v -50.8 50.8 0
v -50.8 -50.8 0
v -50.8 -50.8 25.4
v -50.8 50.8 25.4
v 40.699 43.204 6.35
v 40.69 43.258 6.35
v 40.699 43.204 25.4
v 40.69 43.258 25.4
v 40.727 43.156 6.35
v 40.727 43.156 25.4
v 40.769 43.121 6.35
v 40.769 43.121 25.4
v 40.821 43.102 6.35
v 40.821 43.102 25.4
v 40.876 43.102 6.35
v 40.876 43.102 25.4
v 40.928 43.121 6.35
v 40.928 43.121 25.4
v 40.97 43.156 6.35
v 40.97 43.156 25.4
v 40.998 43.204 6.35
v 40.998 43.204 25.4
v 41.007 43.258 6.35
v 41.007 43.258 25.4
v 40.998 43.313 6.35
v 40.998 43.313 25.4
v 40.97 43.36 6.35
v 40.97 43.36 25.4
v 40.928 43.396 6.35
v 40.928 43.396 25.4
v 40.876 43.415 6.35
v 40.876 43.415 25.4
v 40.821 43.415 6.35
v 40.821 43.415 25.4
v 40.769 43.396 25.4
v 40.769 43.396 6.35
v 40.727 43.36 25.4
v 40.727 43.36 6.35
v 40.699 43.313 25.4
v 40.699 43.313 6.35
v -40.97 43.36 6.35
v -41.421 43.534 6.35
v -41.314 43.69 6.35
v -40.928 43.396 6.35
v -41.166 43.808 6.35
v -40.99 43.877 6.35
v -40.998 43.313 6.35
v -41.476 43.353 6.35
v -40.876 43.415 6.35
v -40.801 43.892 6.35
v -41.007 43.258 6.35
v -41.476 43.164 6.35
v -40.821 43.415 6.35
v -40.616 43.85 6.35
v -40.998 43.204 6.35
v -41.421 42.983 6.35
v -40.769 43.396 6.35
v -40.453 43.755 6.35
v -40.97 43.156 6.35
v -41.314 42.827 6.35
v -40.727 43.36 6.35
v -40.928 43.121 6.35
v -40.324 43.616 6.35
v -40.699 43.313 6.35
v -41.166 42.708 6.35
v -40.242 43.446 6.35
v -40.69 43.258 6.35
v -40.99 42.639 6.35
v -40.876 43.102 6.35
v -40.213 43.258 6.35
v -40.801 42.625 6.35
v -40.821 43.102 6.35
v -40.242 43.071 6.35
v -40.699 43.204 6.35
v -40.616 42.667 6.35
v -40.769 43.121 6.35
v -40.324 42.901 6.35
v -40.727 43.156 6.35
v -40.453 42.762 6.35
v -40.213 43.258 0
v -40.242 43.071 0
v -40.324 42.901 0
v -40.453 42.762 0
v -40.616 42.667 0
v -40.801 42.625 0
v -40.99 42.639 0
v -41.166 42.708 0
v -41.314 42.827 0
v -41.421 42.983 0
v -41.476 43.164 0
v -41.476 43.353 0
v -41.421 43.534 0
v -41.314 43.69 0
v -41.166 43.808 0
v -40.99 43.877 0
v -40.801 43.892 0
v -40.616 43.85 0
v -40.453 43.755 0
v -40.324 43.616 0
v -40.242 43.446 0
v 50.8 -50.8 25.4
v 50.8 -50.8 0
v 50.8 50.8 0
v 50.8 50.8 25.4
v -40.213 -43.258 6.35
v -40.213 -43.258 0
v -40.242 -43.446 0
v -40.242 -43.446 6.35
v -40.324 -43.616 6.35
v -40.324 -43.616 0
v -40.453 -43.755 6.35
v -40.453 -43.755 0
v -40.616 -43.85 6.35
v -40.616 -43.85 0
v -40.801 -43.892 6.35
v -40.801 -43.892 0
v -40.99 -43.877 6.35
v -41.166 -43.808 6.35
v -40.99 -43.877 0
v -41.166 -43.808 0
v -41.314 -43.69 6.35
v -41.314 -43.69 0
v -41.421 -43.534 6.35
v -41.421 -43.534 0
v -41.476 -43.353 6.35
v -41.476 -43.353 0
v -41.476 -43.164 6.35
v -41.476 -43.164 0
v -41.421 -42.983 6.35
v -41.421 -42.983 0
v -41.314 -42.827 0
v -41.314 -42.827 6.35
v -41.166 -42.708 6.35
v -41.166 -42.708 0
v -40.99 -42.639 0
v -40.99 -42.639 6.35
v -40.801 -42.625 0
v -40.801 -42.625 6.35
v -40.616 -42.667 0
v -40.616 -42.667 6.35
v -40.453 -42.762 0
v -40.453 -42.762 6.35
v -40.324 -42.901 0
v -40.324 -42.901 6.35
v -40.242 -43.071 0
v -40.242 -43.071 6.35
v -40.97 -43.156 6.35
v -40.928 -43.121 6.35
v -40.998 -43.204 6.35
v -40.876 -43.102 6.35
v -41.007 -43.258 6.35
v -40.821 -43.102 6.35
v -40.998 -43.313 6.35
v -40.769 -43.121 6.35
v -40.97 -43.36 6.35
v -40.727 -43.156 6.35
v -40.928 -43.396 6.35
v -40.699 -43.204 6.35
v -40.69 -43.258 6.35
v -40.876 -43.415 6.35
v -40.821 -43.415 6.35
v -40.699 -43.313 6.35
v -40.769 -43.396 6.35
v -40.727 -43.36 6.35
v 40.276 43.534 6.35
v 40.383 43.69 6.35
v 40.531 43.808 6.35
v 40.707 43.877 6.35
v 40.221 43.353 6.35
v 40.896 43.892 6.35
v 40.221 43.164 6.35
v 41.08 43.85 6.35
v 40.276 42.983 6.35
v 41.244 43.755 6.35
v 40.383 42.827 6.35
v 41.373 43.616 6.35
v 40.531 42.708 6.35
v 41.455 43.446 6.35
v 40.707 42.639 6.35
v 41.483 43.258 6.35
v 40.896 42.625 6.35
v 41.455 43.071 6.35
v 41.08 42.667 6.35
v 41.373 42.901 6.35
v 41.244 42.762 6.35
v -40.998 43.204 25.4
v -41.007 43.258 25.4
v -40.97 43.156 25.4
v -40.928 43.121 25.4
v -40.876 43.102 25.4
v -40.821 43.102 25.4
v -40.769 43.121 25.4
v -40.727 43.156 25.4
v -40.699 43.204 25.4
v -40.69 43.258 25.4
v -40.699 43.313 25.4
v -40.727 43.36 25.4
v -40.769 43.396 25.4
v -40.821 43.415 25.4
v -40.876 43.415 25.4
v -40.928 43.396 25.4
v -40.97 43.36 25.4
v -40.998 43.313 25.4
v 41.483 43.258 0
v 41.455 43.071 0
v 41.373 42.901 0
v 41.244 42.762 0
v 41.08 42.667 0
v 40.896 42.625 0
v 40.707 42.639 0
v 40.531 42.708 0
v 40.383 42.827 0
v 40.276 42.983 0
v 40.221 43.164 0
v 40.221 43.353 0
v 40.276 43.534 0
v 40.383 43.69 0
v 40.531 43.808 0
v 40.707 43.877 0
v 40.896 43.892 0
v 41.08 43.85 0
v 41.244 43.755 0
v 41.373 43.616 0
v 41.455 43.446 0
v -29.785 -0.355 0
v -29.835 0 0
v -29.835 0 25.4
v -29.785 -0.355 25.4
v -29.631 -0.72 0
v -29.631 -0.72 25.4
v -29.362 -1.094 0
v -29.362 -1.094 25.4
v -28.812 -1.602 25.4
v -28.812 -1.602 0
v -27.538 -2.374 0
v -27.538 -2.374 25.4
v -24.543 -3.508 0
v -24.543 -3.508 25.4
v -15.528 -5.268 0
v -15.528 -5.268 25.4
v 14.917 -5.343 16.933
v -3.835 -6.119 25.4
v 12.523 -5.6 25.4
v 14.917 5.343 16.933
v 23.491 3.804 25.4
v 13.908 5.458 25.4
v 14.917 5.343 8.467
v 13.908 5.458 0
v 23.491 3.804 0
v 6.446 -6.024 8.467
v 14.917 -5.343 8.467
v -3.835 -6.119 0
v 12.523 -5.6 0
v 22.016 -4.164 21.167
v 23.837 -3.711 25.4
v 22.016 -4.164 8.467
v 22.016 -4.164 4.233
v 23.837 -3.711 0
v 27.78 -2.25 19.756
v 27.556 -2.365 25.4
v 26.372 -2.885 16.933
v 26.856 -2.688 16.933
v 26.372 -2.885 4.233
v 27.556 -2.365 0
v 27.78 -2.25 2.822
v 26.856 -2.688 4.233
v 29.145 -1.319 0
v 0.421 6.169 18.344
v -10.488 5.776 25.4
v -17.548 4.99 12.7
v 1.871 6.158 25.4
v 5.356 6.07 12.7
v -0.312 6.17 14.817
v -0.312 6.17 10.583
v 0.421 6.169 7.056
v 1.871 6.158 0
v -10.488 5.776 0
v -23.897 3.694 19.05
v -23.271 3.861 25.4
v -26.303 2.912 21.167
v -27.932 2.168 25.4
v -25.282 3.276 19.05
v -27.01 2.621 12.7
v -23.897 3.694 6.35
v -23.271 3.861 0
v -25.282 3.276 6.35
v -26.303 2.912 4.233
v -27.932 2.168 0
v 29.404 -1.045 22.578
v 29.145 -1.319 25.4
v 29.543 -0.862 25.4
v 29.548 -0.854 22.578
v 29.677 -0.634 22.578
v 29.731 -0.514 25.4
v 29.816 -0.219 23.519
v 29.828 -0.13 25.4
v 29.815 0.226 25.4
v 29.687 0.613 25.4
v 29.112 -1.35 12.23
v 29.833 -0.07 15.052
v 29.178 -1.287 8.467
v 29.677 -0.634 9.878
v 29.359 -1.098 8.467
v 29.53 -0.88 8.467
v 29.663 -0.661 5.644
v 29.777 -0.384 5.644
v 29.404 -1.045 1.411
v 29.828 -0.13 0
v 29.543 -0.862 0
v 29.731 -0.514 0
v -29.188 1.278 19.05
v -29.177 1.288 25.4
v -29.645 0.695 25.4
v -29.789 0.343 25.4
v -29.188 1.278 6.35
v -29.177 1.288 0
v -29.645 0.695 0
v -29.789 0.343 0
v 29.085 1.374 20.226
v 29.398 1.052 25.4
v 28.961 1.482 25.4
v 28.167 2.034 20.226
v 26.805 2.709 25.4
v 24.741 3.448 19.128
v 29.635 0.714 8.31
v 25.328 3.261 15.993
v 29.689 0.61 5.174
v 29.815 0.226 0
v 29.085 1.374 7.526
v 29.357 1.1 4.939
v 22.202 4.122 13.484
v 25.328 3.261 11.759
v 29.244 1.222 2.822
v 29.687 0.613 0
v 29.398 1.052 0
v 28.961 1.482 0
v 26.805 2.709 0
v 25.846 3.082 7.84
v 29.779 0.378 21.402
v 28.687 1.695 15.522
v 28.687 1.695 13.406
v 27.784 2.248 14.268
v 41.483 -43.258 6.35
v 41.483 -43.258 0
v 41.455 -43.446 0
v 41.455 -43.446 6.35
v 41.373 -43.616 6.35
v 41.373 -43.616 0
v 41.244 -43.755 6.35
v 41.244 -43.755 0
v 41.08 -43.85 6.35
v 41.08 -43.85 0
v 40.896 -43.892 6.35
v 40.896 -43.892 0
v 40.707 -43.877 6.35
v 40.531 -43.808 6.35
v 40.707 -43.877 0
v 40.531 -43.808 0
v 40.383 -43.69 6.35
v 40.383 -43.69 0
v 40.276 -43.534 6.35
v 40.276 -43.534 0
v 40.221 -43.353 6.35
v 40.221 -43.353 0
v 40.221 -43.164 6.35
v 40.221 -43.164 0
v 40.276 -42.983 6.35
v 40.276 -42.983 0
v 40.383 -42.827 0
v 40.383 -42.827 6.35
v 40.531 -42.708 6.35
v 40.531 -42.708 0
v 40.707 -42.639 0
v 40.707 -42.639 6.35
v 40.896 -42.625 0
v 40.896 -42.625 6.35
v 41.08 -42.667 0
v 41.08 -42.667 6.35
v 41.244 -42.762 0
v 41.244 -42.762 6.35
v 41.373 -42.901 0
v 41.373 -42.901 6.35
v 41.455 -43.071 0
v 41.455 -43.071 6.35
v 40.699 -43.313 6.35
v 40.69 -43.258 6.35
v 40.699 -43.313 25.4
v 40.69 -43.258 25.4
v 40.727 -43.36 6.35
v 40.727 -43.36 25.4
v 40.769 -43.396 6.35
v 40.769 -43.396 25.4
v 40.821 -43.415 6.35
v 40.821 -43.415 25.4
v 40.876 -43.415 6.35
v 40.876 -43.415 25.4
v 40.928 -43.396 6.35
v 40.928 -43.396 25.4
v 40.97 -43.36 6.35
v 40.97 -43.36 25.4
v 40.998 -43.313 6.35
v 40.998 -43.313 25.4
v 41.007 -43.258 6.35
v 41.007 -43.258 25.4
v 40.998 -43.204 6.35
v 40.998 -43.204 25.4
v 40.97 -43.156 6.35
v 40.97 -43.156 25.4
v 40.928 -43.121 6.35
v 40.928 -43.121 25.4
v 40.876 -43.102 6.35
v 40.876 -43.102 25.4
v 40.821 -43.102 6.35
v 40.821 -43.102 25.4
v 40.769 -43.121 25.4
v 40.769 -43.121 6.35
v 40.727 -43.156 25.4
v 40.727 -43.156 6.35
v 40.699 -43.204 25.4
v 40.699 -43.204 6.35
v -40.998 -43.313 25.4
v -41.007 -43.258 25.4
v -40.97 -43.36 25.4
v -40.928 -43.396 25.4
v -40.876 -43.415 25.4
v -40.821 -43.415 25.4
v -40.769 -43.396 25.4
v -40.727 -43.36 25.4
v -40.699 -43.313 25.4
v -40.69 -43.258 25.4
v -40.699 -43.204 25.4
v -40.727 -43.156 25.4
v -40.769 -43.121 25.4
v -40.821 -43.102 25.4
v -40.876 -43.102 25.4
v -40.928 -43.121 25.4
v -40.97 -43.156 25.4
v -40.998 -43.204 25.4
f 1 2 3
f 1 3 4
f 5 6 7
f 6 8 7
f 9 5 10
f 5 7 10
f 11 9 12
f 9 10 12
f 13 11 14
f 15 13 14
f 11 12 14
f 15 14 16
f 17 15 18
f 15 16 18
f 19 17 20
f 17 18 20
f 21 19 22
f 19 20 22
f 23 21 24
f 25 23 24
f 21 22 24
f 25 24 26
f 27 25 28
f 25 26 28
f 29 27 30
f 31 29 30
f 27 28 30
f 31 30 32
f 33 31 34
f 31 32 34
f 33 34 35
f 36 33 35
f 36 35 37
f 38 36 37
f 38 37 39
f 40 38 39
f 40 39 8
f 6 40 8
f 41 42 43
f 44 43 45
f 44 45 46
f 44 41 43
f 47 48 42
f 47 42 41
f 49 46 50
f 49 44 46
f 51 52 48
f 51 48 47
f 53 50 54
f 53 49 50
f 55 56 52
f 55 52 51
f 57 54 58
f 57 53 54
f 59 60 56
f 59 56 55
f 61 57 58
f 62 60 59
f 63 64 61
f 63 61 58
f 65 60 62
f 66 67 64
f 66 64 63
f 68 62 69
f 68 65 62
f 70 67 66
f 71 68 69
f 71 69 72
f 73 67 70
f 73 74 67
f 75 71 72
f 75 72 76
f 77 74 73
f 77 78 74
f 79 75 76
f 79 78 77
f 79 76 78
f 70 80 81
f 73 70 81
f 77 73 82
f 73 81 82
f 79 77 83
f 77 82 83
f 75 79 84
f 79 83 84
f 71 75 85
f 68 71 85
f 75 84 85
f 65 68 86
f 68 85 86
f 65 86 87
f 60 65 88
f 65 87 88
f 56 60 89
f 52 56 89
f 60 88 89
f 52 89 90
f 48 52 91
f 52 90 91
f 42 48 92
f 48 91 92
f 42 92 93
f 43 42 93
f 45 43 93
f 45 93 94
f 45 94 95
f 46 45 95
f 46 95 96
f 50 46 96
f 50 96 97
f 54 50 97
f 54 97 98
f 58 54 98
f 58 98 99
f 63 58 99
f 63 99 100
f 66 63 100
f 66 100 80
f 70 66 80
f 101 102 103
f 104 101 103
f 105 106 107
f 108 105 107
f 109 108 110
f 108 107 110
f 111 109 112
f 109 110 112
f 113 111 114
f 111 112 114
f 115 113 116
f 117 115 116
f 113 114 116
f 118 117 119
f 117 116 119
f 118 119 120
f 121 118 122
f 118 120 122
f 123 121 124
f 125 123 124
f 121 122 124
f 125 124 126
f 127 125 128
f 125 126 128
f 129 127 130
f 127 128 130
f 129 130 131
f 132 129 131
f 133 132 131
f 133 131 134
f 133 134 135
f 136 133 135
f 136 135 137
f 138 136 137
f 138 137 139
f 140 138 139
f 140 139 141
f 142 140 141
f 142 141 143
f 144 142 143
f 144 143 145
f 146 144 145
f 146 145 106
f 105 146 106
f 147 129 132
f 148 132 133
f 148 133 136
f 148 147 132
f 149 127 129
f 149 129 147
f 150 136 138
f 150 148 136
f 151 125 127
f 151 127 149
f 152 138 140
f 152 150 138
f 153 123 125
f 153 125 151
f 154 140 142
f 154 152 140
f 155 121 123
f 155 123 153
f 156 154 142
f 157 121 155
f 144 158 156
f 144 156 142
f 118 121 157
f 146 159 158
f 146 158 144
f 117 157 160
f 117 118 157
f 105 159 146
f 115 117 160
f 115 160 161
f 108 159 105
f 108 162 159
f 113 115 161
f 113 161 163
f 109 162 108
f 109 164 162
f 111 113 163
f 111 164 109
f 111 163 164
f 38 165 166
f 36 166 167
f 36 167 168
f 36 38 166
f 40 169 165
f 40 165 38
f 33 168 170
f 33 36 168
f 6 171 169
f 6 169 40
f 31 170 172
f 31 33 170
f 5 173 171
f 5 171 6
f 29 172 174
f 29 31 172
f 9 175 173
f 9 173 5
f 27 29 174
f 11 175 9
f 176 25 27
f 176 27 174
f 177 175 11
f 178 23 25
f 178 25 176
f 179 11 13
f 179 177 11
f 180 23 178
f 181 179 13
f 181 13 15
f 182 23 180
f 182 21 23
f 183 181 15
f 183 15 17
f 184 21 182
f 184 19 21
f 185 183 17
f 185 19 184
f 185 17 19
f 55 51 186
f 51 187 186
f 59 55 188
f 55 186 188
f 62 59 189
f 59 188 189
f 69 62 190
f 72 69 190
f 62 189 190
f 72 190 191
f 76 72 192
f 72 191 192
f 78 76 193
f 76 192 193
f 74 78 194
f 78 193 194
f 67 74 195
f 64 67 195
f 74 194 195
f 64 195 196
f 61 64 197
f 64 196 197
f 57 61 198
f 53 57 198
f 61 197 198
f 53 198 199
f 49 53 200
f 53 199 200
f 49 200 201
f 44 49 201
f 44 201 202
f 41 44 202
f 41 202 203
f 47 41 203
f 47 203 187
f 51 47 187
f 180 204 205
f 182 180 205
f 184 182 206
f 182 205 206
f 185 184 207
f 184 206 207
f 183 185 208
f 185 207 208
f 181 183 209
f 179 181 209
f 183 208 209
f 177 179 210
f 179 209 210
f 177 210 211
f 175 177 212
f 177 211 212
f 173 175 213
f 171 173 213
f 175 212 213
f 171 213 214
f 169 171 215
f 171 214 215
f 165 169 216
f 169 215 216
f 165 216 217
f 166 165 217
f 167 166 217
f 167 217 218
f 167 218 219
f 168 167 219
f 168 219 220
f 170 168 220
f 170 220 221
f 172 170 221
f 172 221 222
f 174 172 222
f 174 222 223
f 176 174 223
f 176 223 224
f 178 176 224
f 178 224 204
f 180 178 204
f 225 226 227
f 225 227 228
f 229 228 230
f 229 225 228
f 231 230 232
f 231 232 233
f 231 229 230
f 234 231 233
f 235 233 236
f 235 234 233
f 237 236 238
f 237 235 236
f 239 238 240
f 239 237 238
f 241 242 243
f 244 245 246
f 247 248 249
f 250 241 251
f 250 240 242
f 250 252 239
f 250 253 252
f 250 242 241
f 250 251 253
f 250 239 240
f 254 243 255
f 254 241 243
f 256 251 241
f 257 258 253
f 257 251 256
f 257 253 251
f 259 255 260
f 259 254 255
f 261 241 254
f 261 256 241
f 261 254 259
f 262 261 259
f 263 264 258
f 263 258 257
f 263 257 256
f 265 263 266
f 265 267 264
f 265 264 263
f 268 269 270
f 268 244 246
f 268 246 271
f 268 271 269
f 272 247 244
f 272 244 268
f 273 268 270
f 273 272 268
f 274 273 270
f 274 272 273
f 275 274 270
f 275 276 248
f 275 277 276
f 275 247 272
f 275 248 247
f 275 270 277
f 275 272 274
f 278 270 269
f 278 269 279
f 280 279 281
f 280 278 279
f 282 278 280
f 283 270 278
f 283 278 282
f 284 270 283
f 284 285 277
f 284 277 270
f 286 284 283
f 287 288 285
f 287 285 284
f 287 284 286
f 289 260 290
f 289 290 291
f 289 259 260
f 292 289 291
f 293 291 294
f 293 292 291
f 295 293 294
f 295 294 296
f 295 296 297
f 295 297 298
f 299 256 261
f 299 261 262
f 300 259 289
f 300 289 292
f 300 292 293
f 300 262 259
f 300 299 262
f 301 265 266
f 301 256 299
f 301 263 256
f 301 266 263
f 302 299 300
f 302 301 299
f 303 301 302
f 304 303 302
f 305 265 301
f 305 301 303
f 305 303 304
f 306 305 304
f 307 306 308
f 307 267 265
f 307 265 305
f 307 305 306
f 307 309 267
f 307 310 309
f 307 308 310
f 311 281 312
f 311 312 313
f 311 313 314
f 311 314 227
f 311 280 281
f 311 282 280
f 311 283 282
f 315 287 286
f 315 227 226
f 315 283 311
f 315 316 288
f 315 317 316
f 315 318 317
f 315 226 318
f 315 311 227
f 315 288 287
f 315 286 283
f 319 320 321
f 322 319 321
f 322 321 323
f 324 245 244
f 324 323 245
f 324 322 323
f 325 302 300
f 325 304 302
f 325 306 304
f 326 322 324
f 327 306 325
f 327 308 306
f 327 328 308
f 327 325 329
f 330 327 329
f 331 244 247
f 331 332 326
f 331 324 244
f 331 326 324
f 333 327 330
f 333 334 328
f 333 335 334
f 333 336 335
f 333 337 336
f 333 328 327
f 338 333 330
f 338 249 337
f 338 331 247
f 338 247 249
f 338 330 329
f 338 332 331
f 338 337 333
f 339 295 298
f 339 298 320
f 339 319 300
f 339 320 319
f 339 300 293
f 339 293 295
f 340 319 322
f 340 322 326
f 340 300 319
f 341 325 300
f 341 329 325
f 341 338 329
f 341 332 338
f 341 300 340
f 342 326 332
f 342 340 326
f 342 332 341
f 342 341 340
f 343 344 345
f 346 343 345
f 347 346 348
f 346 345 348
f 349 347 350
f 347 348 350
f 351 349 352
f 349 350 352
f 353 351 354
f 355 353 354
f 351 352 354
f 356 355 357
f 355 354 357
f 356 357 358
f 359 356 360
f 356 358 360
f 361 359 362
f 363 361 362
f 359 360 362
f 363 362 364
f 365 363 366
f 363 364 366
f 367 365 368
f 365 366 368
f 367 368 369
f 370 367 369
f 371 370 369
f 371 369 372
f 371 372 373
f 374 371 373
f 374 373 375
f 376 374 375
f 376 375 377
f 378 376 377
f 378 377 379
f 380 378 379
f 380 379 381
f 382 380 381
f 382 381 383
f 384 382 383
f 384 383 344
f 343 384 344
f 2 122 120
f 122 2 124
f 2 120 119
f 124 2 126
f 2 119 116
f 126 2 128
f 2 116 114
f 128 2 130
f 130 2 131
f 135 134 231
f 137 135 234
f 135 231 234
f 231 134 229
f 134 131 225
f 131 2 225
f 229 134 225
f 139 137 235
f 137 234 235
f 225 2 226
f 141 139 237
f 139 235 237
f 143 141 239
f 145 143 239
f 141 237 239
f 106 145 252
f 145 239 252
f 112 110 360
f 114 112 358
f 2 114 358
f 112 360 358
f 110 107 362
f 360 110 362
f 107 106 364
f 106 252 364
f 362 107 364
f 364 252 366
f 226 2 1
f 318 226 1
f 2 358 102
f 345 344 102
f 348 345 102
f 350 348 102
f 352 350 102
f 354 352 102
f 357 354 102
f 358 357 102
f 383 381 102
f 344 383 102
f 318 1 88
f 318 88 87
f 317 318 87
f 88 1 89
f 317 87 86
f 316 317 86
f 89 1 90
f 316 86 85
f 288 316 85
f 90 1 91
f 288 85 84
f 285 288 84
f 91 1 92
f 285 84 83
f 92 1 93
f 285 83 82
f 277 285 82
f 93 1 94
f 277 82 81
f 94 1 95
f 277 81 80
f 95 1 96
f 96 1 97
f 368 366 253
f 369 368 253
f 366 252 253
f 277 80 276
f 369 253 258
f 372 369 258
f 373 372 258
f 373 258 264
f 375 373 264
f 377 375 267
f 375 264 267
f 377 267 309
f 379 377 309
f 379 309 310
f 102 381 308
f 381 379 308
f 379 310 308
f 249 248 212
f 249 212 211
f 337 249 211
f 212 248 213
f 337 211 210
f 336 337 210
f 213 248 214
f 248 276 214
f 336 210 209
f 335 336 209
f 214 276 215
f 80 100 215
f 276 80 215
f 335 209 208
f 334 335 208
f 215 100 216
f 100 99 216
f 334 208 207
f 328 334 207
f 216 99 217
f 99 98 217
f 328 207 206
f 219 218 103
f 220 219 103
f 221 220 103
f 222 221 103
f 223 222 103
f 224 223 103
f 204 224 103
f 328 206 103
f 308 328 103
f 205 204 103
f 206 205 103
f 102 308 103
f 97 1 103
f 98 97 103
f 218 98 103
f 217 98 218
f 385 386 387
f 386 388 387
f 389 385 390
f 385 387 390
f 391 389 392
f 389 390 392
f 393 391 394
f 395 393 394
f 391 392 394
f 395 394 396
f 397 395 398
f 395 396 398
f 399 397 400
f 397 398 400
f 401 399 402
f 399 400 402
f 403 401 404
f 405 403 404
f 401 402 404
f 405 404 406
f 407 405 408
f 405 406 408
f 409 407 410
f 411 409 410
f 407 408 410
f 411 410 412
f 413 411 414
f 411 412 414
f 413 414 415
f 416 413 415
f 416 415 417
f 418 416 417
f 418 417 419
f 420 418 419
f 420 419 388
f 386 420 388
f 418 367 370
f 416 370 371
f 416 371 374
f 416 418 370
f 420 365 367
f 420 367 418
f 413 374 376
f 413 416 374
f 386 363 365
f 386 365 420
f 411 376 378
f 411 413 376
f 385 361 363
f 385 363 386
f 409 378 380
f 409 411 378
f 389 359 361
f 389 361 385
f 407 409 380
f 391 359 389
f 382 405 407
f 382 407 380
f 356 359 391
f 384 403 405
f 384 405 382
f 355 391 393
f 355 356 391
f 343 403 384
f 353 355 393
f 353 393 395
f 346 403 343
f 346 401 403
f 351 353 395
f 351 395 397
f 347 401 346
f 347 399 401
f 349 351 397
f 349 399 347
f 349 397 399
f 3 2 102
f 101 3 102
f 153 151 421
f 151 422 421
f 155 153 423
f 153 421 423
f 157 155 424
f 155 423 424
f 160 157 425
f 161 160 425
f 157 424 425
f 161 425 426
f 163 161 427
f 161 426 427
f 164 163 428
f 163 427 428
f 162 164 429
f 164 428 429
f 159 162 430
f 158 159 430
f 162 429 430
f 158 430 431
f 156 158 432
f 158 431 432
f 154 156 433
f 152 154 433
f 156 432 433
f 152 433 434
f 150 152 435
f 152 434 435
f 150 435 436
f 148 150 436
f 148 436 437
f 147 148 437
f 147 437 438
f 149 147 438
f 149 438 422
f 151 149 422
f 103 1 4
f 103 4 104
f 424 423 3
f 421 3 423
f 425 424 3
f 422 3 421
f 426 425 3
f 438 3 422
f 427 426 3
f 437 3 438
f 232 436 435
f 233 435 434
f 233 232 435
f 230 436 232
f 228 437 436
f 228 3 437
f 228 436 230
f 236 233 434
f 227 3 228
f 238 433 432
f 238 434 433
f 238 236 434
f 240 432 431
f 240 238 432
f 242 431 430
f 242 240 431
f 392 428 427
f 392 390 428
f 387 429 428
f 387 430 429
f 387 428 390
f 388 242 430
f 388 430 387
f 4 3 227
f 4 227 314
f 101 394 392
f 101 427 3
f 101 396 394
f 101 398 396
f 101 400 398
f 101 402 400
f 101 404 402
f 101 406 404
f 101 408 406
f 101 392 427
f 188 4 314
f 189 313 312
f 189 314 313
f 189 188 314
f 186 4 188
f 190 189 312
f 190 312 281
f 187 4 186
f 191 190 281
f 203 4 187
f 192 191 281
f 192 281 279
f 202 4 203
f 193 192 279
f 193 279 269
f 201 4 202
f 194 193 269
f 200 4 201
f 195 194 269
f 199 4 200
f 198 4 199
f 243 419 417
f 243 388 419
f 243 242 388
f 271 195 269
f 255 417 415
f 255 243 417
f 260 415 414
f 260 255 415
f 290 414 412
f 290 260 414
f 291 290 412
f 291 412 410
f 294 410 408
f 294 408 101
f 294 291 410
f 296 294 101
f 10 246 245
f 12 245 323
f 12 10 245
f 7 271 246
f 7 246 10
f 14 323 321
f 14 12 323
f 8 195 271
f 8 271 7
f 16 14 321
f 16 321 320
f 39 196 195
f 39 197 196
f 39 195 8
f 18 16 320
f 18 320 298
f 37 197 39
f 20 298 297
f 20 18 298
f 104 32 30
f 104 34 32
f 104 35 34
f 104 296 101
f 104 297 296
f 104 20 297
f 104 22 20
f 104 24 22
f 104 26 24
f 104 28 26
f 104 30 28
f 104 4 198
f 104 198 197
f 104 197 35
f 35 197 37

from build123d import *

# Parameters (mm, degrees)
F0_W           = 101.6
F0_H           = 101.6
F1_DEPTH       = 25.4
F3_D           = 0.3175
F3_CBORE_D     = 1.27
F3_CBORE_DEPTH = 6.35


with BuildPart() as f1:
    # F0 (on Top) → F1 (new body)
    with BuildSketch(Plane.XY):
        Rectangle(F0_W, F0_H)
        with BuildLine():
            add(Edge.make_bspline(
                [(-29.834867, 0), (-29.834867, -10.686521), (14.917433, -5.34326), (59.669733, 0), (14.917433, 5.34326), (-29.834867, 10.686521), (-29.834867, 0)],
                knots=[0, 0, 0, 2.094395, 2.094395, 4.18879, 4.18879, 6.283185, 6.283185, 6.283185], degree=2, weights=[1, 0.5, 1, 0.5, 1, 0.5, 1]))
        make_face(mode=Mode.SUBTRACT)
    extrude(amount=F1_DEPTH)

    # F3 (through all)
    with Locations(Plane(origin=(0, 0, 0), x_dir=(1, 0, 0), z_dir=(0, 0, -1))):
        with Locations((-40.848479, 43.258417), (40.848479, 43.258417), (40.848479, -43.258417), (-40.848479, -43.258417)):
            CounterBoreHole(F3_D / 2, F3_CBORE_D / 2, F3_CBORE_DEPTH)


solid = f1.part
